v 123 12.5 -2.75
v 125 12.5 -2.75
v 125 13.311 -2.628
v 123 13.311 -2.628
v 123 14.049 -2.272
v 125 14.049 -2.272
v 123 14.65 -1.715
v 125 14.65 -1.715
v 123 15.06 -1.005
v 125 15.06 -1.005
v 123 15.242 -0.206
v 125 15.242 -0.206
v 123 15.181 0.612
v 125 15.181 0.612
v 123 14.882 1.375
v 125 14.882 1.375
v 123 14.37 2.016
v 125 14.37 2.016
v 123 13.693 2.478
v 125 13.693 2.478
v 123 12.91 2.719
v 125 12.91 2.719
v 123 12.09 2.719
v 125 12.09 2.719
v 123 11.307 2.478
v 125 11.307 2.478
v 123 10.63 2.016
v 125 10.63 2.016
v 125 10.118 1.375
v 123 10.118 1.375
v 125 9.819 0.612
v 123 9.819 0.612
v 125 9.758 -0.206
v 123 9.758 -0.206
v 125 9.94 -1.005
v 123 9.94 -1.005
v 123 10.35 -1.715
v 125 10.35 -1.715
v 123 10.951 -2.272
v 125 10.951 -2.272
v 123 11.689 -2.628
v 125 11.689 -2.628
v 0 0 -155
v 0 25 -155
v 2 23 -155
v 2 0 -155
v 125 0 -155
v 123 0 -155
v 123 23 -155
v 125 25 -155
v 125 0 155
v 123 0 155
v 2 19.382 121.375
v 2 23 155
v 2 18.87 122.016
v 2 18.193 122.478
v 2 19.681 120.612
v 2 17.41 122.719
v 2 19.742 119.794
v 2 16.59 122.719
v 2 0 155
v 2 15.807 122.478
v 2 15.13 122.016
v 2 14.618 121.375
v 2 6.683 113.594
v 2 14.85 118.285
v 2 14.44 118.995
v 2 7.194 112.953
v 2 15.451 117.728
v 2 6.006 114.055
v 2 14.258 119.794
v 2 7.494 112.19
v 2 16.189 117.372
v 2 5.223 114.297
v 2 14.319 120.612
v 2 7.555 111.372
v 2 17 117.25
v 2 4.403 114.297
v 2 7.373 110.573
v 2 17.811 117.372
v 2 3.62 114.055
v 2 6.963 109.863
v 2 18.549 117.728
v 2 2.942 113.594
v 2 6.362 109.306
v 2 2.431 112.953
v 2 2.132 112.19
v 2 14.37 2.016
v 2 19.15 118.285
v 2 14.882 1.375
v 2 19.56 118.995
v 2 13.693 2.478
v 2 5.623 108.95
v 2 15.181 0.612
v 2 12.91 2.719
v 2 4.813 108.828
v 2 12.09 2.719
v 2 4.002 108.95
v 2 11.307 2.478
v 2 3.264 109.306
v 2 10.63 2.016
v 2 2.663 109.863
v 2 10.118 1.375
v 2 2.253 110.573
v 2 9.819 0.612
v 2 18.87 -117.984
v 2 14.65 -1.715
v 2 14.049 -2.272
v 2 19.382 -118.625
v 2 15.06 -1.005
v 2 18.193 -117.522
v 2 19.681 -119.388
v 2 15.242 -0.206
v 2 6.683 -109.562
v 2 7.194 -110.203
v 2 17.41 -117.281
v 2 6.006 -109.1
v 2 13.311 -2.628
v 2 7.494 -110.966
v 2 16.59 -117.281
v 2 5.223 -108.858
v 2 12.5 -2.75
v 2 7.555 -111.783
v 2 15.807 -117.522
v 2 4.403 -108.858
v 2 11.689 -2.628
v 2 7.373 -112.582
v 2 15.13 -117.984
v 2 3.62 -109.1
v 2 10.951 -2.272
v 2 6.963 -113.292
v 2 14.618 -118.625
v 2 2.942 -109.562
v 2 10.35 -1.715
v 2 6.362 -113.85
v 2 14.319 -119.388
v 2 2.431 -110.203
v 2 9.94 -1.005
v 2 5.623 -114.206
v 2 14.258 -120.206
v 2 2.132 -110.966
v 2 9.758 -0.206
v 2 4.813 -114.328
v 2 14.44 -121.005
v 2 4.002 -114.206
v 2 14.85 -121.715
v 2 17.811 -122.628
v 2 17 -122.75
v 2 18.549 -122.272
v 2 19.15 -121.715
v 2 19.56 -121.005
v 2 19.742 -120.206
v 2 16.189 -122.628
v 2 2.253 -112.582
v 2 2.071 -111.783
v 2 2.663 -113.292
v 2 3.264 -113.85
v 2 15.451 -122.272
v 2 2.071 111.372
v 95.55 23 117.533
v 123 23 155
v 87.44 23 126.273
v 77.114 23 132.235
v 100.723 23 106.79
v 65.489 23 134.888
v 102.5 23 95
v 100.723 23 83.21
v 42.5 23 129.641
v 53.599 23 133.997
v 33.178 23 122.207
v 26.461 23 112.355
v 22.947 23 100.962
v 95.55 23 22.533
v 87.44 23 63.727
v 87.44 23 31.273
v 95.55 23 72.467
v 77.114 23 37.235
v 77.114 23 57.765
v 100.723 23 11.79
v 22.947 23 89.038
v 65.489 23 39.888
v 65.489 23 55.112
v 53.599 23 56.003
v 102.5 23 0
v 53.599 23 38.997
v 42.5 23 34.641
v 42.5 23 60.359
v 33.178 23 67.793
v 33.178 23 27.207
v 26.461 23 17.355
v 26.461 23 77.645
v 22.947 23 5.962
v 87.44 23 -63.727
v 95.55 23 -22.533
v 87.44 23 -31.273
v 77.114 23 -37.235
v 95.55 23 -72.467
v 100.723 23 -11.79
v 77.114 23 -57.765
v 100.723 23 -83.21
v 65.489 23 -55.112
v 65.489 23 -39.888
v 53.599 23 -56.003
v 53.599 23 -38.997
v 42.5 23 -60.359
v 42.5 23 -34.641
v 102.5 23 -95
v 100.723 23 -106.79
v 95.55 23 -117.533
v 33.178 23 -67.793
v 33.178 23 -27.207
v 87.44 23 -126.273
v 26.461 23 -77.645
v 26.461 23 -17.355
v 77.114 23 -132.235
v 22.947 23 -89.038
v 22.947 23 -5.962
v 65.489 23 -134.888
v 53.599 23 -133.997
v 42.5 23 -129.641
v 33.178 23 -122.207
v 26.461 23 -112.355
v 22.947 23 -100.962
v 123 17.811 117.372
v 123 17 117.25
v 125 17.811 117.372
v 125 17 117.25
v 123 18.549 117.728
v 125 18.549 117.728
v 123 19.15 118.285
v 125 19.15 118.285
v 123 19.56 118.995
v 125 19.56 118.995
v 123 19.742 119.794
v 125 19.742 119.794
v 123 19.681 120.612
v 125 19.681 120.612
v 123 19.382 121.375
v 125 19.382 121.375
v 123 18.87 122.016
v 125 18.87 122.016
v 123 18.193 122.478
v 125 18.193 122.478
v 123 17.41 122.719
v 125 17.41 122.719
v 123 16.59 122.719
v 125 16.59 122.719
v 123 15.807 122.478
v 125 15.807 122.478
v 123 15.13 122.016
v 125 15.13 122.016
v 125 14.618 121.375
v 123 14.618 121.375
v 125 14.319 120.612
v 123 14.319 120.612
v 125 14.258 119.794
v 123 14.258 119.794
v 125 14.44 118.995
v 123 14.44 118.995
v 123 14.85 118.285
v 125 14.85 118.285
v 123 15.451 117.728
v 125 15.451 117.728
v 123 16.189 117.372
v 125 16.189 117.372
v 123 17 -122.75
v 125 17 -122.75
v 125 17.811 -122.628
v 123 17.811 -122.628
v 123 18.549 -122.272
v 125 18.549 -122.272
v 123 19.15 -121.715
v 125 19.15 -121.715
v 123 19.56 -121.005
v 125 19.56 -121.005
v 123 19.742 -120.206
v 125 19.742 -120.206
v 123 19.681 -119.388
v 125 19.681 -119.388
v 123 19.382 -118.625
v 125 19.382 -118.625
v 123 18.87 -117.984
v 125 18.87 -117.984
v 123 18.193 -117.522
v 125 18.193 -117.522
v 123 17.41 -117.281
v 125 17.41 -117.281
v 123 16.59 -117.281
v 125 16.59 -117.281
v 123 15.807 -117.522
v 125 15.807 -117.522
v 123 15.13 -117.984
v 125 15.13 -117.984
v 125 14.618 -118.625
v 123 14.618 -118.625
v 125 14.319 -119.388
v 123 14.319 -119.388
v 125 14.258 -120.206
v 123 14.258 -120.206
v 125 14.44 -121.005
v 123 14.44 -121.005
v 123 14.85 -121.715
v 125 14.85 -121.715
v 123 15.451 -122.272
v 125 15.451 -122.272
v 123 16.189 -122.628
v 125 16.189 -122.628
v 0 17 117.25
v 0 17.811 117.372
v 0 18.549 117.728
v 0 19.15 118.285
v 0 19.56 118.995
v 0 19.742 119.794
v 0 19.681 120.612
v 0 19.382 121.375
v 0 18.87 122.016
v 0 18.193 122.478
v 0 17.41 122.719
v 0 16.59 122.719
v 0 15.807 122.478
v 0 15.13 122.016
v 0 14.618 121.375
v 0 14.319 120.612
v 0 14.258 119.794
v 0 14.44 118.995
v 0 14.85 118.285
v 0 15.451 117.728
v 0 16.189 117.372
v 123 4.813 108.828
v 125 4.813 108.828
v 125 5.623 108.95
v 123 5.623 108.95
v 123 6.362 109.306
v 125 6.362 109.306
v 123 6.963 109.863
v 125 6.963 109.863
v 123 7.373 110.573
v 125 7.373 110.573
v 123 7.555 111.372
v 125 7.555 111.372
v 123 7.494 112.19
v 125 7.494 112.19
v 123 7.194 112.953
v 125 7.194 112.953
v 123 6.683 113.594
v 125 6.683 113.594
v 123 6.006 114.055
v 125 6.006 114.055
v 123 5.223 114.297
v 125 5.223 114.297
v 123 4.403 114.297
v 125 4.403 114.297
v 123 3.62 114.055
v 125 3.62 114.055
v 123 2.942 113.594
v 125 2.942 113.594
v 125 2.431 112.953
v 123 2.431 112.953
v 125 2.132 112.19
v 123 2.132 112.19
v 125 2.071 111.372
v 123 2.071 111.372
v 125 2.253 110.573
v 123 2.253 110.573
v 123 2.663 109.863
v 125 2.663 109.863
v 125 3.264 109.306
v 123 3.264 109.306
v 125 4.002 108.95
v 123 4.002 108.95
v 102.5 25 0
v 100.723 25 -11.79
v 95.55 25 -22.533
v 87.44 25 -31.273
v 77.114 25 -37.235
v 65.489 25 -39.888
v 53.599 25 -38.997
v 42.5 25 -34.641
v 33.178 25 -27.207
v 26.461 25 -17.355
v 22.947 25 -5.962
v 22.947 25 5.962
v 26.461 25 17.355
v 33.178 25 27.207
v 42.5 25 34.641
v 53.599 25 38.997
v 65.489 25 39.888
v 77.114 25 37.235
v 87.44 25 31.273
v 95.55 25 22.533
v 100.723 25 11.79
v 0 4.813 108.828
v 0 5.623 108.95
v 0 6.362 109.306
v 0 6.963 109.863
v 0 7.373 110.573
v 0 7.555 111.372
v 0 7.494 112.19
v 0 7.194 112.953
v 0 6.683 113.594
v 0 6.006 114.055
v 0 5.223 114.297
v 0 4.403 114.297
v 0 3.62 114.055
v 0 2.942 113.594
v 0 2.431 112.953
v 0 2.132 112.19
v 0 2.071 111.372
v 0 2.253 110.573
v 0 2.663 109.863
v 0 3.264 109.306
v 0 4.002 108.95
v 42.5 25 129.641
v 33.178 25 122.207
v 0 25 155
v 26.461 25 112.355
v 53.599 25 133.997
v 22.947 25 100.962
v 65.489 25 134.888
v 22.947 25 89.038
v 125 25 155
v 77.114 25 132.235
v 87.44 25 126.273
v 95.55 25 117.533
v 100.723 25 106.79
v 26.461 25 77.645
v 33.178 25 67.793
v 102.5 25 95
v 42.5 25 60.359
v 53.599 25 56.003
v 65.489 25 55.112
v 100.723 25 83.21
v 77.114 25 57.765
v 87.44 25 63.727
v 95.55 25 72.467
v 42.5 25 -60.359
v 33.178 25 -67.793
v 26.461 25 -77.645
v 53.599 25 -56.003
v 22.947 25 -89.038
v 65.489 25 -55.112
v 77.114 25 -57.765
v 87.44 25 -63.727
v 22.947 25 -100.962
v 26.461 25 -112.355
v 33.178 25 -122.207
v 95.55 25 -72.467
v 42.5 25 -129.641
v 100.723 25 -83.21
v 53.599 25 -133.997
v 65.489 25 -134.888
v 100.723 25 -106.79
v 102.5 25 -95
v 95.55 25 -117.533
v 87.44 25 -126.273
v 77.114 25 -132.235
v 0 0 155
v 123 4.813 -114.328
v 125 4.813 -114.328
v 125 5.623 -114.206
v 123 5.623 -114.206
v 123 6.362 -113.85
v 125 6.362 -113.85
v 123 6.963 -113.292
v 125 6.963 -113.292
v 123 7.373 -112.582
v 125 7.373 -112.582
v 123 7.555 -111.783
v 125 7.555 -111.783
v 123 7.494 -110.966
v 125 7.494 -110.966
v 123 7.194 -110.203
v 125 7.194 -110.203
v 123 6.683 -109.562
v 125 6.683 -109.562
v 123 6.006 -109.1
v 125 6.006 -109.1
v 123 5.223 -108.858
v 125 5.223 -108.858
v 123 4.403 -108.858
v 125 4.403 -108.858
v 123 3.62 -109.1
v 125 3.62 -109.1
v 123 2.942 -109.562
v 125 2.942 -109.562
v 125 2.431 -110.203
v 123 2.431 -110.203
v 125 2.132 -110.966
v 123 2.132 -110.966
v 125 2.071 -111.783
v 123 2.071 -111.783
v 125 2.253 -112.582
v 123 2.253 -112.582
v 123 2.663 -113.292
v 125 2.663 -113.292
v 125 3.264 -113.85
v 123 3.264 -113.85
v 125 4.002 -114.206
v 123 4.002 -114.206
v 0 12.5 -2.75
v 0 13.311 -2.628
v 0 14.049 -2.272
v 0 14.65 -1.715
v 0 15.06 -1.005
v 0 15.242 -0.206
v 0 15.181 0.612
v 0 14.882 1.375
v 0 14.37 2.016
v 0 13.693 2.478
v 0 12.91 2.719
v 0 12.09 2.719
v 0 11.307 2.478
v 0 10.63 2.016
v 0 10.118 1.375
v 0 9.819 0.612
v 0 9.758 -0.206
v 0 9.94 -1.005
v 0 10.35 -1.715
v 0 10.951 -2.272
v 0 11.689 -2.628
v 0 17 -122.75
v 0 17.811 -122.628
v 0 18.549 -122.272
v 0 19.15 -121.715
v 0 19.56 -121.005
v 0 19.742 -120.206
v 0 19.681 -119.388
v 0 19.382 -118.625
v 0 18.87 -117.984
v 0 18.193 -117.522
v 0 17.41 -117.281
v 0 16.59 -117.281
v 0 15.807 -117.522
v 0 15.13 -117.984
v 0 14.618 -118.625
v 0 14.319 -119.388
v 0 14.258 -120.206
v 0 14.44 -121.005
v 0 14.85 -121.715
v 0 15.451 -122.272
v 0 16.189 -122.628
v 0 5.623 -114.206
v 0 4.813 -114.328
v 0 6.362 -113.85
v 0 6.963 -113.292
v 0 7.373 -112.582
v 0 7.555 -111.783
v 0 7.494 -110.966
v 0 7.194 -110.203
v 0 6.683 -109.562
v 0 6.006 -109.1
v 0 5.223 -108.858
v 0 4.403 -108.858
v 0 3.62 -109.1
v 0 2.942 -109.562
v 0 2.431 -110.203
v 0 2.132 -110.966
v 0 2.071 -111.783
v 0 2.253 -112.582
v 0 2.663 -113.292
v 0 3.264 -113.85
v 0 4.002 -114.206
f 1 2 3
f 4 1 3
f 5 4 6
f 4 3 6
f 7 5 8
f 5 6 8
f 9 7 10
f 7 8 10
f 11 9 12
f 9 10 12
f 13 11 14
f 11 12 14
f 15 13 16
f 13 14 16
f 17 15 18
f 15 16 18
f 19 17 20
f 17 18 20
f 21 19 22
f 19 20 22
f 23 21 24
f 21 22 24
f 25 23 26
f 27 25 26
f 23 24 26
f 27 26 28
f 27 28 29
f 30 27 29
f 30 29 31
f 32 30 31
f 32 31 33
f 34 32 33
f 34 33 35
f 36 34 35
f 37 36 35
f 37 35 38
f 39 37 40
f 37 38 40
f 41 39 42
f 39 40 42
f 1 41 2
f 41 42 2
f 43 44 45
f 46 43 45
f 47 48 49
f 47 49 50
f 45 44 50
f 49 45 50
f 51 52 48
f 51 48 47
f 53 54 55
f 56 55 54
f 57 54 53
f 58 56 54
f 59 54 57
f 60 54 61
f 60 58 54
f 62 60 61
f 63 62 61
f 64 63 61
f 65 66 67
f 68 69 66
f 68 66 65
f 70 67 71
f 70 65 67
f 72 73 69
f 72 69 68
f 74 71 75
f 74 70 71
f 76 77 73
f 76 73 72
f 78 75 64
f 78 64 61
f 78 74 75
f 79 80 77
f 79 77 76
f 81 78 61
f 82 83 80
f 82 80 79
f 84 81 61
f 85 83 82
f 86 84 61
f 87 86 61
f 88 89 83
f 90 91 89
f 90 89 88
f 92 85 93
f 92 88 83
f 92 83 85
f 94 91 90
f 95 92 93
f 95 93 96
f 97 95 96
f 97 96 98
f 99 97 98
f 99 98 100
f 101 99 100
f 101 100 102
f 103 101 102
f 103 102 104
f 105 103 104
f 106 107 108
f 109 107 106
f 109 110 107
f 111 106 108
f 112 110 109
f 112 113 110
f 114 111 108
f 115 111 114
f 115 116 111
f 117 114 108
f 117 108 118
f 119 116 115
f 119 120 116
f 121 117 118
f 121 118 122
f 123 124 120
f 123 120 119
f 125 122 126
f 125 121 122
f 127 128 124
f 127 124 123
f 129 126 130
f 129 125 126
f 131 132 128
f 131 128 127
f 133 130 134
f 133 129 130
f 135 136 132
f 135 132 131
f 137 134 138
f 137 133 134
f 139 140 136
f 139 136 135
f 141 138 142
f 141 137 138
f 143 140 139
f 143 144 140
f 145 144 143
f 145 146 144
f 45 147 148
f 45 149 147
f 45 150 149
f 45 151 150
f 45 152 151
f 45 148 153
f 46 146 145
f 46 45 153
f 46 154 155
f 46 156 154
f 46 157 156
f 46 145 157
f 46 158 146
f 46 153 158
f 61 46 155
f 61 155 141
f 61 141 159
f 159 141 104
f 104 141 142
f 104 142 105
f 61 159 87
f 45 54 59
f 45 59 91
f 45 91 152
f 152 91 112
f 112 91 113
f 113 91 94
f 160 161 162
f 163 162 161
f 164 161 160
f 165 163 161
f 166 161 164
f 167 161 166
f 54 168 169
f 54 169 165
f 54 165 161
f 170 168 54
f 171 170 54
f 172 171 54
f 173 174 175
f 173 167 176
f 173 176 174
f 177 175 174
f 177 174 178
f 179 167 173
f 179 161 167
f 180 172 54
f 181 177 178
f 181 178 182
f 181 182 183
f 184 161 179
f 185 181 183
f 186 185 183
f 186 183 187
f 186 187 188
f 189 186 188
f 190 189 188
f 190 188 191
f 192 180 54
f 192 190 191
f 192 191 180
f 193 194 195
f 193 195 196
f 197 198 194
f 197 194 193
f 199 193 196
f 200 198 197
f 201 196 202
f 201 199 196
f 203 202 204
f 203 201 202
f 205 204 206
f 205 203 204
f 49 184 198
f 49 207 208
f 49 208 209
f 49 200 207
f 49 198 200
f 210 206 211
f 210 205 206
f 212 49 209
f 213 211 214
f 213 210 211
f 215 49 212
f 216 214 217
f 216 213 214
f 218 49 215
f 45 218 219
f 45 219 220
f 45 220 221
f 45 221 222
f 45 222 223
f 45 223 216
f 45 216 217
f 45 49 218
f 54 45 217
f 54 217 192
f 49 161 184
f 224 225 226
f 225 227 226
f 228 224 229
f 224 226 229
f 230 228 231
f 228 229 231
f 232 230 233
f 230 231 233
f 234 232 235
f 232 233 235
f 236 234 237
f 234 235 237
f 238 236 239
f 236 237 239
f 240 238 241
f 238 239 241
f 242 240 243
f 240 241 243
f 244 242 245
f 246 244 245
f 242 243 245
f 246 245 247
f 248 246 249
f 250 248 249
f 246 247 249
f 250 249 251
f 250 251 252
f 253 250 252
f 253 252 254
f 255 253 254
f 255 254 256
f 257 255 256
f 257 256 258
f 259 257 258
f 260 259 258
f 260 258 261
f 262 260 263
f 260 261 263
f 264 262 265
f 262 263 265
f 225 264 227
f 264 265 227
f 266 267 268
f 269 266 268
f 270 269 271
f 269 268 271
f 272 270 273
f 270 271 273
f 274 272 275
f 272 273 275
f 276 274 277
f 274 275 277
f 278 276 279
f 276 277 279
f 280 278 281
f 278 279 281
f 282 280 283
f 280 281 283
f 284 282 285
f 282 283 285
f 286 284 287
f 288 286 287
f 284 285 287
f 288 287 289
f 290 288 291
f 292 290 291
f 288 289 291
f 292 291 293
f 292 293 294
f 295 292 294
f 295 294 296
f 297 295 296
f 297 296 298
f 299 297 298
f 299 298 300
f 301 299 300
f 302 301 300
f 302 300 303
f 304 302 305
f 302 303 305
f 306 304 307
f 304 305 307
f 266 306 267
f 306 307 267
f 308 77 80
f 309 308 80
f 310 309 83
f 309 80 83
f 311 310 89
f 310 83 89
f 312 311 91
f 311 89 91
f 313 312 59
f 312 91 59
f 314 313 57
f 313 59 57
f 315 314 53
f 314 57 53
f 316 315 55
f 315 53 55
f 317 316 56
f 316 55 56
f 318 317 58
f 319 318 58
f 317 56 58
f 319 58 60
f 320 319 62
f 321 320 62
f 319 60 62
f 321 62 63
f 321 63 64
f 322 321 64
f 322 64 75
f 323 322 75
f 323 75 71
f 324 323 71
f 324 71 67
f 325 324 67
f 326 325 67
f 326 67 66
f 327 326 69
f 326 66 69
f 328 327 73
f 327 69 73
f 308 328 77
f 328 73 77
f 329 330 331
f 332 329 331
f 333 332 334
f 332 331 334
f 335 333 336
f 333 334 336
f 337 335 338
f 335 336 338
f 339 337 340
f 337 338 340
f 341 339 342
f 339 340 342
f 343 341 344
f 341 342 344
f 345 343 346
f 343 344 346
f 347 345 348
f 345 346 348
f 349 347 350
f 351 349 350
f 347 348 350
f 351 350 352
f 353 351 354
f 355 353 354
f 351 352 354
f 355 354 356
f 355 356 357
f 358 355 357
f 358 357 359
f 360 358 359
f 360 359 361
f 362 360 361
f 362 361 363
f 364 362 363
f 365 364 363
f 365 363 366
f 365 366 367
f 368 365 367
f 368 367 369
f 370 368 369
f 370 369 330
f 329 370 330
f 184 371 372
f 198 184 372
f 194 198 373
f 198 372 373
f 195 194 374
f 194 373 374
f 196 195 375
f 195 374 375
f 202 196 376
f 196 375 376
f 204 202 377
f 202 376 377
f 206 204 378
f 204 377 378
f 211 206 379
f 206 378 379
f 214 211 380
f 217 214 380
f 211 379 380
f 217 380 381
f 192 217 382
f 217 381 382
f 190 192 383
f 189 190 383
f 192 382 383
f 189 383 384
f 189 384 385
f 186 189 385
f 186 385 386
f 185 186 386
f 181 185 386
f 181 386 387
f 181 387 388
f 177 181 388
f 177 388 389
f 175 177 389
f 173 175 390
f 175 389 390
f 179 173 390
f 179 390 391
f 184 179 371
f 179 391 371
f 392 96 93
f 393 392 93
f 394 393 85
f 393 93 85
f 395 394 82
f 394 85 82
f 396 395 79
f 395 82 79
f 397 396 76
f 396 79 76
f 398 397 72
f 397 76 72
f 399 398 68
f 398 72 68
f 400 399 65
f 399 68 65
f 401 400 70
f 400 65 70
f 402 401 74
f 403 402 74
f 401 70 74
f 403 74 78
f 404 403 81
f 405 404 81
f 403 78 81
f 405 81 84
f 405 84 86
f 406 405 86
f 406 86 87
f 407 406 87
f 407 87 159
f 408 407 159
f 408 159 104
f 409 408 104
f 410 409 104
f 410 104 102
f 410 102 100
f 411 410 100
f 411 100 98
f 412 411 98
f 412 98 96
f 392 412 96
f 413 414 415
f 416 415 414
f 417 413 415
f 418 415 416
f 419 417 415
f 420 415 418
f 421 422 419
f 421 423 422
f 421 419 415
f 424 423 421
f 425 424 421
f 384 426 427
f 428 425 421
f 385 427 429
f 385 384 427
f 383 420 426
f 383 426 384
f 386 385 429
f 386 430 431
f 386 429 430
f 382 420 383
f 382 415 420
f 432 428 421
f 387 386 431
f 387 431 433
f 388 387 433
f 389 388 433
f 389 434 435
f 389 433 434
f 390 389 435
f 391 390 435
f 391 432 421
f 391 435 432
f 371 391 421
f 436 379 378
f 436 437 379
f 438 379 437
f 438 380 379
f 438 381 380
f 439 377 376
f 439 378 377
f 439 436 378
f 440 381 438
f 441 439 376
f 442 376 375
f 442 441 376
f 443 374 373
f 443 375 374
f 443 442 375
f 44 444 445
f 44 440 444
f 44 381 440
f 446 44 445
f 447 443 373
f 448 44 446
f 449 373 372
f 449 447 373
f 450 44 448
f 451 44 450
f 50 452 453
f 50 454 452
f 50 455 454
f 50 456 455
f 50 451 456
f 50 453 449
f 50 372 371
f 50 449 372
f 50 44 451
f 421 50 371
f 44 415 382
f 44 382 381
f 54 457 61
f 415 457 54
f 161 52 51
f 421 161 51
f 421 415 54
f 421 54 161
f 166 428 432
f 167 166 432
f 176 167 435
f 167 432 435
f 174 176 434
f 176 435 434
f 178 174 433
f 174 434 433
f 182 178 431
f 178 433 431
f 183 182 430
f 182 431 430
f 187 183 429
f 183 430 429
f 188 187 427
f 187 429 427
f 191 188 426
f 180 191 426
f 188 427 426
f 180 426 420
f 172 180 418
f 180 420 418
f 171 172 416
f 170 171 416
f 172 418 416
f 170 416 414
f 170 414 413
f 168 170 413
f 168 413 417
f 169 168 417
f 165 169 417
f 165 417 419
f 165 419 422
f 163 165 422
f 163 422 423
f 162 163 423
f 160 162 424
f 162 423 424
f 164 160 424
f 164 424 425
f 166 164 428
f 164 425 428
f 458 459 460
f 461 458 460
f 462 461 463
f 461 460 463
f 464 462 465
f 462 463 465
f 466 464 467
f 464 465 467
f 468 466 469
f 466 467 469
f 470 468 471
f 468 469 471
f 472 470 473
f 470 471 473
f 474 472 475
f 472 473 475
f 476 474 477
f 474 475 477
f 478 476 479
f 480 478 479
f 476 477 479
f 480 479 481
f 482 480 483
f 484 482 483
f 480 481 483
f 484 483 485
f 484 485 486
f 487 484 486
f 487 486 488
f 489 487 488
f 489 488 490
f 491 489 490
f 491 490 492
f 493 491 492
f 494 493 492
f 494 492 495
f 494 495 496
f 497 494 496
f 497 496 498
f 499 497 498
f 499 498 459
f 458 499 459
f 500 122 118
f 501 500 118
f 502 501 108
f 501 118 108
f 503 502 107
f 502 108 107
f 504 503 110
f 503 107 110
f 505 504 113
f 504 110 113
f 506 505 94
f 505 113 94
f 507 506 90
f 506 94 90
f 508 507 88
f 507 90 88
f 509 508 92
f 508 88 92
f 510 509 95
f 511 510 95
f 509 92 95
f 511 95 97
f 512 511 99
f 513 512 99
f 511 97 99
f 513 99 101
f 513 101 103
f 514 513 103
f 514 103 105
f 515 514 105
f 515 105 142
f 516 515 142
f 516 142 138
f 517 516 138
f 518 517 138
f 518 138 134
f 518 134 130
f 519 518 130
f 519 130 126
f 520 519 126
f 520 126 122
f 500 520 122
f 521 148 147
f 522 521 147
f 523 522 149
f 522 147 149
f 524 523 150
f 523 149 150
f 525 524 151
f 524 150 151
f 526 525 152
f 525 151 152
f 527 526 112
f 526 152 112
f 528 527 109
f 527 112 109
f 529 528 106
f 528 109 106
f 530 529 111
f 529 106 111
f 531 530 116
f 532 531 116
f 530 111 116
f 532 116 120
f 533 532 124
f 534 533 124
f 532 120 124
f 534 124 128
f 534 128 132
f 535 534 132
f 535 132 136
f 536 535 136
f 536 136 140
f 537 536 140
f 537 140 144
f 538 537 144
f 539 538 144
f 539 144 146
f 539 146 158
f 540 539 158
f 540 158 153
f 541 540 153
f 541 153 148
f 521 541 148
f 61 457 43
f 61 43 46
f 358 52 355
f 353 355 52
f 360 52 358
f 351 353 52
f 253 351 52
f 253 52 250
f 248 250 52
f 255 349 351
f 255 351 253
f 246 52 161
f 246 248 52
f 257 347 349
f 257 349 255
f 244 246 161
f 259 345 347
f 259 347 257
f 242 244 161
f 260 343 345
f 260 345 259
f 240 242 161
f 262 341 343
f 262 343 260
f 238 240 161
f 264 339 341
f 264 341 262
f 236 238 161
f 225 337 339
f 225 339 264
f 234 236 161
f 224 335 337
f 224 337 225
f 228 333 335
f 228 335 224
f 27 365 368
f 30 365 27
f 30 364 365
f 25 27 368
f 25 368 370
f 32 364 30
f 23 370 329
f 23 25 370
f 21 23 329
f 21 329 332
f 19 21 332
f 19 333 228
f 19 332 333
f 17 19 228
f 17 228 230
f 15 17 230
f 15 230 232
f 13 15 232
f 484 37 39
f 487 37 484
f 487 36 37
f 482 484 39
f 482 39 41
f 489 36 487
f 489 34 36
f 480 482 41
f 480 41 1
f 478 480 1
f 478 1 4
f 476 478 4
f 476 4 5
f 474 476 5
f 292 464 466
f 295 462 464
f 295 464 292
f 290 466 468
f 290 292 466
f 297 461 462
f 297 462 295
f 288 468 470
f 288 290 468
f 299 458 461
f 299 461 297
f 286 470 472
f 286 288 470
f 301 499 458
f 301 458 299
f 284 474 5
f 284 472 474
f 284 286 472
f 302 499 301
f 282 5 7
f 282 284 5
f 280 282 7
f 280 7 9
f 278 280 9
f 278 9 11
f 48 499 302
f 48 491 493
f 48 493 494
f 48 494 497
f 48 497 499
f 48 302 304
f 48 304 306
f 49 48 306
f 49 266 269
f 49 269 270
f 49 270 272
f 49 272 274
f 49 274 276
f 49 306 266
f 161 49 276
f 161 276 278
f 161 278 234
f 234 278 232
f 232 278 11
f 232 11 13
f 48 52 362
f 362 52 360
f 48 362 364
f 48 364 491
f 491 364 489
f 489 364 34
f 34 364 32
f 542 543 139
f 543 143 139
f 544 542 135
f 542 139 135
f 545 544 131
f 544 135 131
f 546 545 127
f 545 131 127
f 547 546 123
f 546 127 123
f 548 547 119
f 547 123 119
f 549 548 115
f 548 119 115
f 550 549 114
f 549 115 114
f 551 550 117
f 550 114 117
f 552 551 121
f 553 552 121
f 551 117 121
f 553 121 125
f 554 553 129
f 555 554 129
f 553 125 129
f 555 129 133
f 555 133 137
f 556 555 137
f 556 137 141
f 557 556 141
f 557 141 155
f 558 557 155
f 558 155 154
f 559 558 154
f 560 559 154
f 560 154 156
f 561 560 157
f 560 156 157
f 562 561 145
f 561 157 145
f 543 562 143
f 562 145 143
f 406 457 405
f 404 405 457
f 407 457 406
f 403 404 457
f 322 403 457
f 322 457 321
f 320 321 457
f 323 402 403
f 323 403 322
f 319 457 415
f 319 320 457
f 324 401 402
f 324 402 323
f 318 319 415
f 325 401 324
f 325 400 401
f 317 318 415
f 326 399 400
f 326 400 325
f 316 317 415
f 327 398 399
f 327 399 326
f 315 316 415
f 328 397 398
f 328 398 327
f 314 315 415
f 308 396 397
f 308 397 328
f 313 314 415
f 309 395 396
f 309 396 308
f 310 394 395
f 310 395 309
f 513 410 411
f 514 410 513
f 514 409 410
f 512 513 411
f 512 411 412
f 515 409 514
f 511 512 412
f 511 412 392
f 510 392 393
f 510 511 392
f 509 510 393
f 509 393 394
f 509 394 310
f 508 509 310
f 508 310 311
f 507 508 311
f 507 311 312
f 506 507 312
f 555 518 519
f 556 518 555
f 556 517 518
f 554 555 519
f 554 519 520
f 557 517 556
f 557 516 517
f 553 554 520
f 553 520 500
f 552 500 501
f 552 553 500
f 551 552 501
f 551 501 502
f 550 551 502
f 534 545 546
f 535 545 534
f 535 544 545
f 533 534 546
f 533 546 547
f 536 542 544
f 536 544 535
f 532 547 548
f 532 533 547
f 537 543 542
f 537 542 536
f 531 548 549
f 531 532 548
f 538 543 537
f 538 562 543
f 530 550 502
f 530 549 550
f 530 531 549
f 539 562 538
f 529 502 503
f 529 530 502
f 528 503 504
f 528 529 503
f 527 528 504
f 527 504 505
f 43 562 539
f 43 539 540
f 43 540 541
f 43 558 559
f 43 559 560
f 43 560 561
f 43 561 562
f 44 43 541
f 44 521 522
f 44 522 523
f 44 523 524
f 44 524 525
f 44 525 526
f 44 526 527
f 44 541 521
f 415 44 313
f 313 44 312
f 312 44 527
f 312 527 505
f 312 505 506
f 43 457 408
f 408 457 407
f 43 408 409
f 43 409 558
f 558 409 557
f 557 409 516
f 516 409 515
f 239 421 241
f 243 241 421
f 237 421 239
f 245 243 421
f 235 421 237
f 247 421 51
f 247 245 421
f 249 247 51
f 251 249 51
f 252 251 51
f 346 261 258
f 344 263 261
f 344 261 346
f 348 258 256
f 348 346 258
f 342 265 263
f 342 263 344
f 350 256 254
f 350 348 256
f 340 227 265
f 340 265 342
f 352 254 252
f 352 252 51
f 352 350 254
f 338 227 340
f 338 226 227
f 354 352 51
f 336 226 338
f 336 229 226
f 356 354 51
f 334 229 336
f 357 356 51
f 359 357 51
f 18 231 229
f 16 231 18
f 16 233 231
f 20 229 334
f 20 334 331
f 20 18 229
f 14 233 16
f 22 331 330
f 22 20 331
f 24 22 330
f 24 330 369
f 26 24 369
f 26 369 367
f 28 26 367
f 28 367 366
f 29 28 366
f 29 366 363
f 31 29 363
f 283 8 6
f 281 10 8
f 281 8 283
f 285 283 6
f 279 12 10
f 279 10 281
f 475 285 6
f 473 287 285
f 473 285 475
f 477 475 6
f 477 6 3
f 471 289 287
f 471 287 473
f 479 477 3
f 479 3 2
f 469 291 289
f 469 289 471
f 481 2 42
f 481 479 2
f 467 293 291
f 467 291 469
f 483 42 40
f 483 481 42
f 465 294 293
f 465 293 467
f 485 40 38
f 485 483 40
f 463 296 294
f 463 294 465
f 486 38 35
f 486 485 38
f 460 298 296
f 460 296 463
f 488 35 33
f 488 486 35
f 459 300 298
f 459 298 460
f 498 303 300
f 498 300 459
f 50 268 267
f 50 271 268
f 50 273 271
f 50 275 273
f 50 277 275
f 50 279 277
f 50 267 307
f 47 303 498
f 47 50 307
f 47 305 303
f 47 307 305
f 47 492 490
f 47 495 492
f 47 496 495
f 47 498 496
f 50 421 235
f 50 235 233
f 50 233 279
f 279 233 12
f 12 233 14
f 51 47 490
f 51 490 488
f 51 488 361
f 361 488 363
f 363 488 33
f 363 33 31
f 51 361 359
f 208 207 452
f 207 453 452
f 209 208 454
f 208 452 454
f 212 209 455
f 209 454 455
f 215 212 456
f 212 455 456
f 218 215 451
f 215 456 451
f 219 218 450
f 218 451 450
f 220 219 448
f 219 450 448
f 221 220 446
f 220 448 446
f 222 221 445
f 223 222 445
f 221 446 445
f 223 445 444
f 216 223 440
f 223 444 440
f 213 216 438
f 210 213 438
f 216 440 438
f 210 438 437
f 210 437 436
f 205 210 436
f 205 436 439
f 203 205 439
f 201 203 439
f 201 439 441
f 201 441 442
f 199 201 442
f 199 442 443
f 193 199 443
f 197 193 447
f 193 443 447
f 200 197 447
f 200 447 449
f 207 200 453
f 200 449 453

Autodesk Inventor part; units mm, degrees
ref_plane "YZ Plane" through (0, 0, 0) normal (1, 0, 0) x (0, 1, 0)
ref_plane "XZ Plane" through (0, 0, 0) normal (0, 1, 0) x (-1, 0, 0)
ref_plane "XY Plane" through (0, 0, 0) normal (0, 0, 1) x (1, 0, 0)
sketch "Sketch1" plane through (0, 0, 0) normal (0, 0, 1) x (1, 0, 0)
  line L0 (0, 0) -> (0, 25)
  line L1 (0, 25) -> (125, 25)
  line L2 (125, 25) -> (125, 0)
  line L3 (123, 0) -> (123, 23)
  line L4 (123, 23) -> (2, 23)
  line L5 (2, 23) -> (2, 0)
  line L6 (0, 0) -> (2, 0)
  line L7 (123, 0) -> (125, 0)
  dimension "d0" = 25
  dimension "d1" = 125
  dimension "d2" = 25
  dimension "d3" = 2
extrude "Extrusion1" add sketch "Sketch1" along normal mid plane 310
sketch "Sketch2" plane through (125, 0, 155) normal (1, 0, 0) x (0, 0, -1)
  line L0 (-37.205, -32.4182) -> (-16.8959, -51.5992) projected
  arc A0 (-19.2763, -56.7631) -> (-16.8959, -51.5992) centre (-18.9558, -53.7803) ccw projected
  line L1 (-19.2763, -56.7631) -> (-50.7848, -53.3777) projected
  arc A1 (-50.7848, -53.3777) -> (-55.7745, -43.3621) centre (-69.9997, -56.6998) ccw projected
  line L2 (-55.7745, -43.3621) -> (-48.1388, -31.7992) projected
  arc A2 (-48.1388, -31.7992) -> (-37.205, -32.4182) centre (-41.913, -18.7038) ccw projected
  line L3 (-75.1262, -21.5392) -> (-58.4114, -21.5392) projected
  arc A3 (-55.5831, -23.5388) -> (-58.4114, -21.5392) centre (-58.4114, -24.5392) ccw projected
  arc A4 (-55.5831, -23.5388) -> (-54.0148, -26.691) centre (-41.913, -18.7038) ccw projected
  arc A5 (-54.0941, -30.1103) -> (-54.0148, -26.691) centre (-56.5186, -28.3435) ccw projected
  line L4 (-54.0941, -30.1103) -> (-59.464, -37.4794) projected
  arc A6 (-62.97, -38.511) -> (-59.464, -37.4794) centre (-61.8885, -35.7127) ccw projected
  arc A7 (-62.97, -38.511) -> (-89.4714, -57.7495) centre (-69.9997, -56.6998) ccw projected
  arc A8 (-91.9686, -60.8693) -> (-89.4714, -57.7495) centre (-92.4671, -57.911) ccw projected
  arc A9 (-94.9644, -58.0288) -> (-91.9686, -60.8693) centre (-91.9686, -57.8693) ccw projected
  arc A10 (-90.8616, -42.9236) -> (-94.9644, -58.0288) centre (-69.9997, -56.6998) ccw projected
  line L5 (-90.8616, -42.9236) -> (-77.6297, -22.886) projected
  arc A11 (-75.1262, -21.5392) -> (-77.6297, -22.886) centre (-75.1262, -24.5392) ccw projected
  line L6 (14.2226, -42.1262) -> (14.481, -34.3473) projected
  arc A12 (16.1692, -31.7481) -> (14.481, -34.3473) centre (17.4793, -34.4469) ccw projected
  arc A13 (16.1692, -31.7481) -> (22.7187, -25.3606) centre (9.837, -18.7038) ccw projected
  arc A14 (25.3838, -23.7379) -> (22.7187, -25.3606) centre (25.3838, -26.7379) ccw projected
  line L7 (25.3838, -23.7379) -> (32.9823, -23.7379) projected
  arc A15 (35.8164, -27.7217) -> (32.9823, -23.7379) centre (32.9823, -26.7379) ccw projected
  arc A16 (20.9479, -43.8593) -> (35.8164, -27.7217) centre (9.837, -18.7038) ccw projected
  line L8 (20.9479, -43.8593) -> (18.4331, -44.97) projected
  arc A17 (14.2226, -42.1262) -> (18.4331, -44.97) centre (17.221, -42.2258) ccw projected
  arc A18 (-58.5566, -72.4892) -> (-51.863, -63.8628) centre (-69.9997, -56.6998) ccw projected
  arc A19 (-48.6463, -61.9952) -> (-51.863, -63.8628) centre (-49.0727, -64.9648) ccw projected
  line L9 (-48.6463, -61.9952) -> (-37.4684, -63.6003) projected
  arc A20 (-36.6827, -69.3141) -> (-37.4684, -63.6003) centre (-37.8948, -66.5698) ccw projected
  line L10 (-36.6827, -69.3141) -> (-55.5841, -77.6626) projected
  arc A21 (-58.5566, -72.4892) -> (-55.5841, -77.6626) centre (-56.7962, -74.9183) ccw projected
  arc A22 (-88.4942, -73.521) -> (-79.2774, -79.9145) centre (-69.9997, -56.6998) ccw projected
  arc A23 (-87.0146, -70.1753) -> (-88.4942, -73.521) centre (-87.0146, -72.1753) ccw projected
  arc A24 (-83.5364, -70.7358) -> (-84.9248, -70.1753) centre (-84.9248, -72.1753) ccw projected
  arc A25 (-83.5364, -70.7358) -> (-77.7157, -74.6082) centre (-69.9997, -56.6998) ccw projected
  arc A26 (-76.5074, -76.4798) -> (-77.7157, -74.6082) centre (-78.5071, -76.445) ccw projected
  line L11 (14.545, -2.9927) -> (14.545, 4.5521) projected
  arc A27 (18.4889, 7.3998) -> (14.545, 4.5521) centre (17.545, 4.5521) ccw projected
  arc A28 (35.8164, -9.6858) -> (18.4889, 7.3998) centre (9.837, -18.7038) ccw projected
  arc A29 (32.9823, -13.6696) -> (35.8164, -9.6858) centre (32.9823, -10.6696) ccw projected
  line L12 (32.9823, -13.6696) -> (25.3838, -13.6696) projected
  arc A30 (22.7187, -12.0469) -> (25.3838, -13.6696) centre (25.3838, -10.6696) ccw projected
  arc A31 (22.7187, -12.0469) -> (16.2237, -5.6861) centre (9.837, -18.7038) ccw projected
  arc A32 (14.545, -2.9927) -> (16.2237, -5.6861) centre (17.545, -2.9927) ccw projected
  line L13 (-41.913, 8.7962) -> (-41.4149, 8.7962) projected
  arc A33 (-38.601, 4.7561) -> (-41.4149, 8.7962) centre (-41.4149, 5.7962) ccw projected
  line L14 (-38.601, 4.7561) -> (-41.237, -2.375) projected
  arc A34 (-43.6844, -4.3124) -> (-41.237, -2.375) centre (-44.0509, -1.3349) ccw projected
  arc A35 (-43.6844, -4.3124) -> (-55.5831, -13.8687) centre (-41.913, -18.7038) ccw projected
  arc A36 (-58.4114, -15.8684) -> (-55.5831, -13.8687) centre (-58.4114, -12.8684) ccw projected
  line L15 (-58.4114, -15.8684) -> (-67.4194, -15.8684) projected
  arc A37 (-69.9228, -11.2152) -> (-67.4194, -15.8684) centre (-67.4194, -12.8684) ccw projected
  line L16 (-69.9228, -11.2152) -> (-64.861, -3.5499) projected
  arc A38 (-41.913, 8.7962) -> (-64.861, -3.5499) centre (-41.913, -18.7038) ccw projected
  line L17 (-27.9232, -22.5166) -> (-4.1527, -22.5166) projected
  arc A39 (-4.1527, -22.5166) -> (3.5036, -31.7475) centre (9.837, -18.7038) ccw projected
  arc A40 (5.1099, -35.1484) -> (3.5036, -31.7475) centre (2.1933, -34.4462) ccw projected
  line L18 (5.1099, -35.1484) -> (1.9297, -48.3572) projected
  arc A41 (-2.7527, -50.0803) -> (1.9297, -48.3572) centre (-0.9869, -47.6549) ccw projected
  line L19 (-2.7527, -50.0803) -> (-31.7052, -29.0019) projected
  arc A42 (-31.7052, -29.0019) -> (-27.9232, -22.5166) centre (-41.913, -18.7038) ccw projected
  line L20 (-6.2824, -14.891) -> (-25.7935, -14.891) projected
  arc A43 (-28.5569, -13.0589) -> (-25.7935, -14.891) centre (-25.7935, -11.891) ccw projected
  arc A44 (-28.5569, -13.0589) -> (-34.5765, -6.1967) centre (-41.913, -18.7038) ccw projected
  arc A45 (-35.7016, -2.1898) -> (-34.5765, -6.1967) centre (-33.0586, -3.6091) ccw projected
  line L21 (-35.7016, -2.1898) -> (-30.651, 7.2155) projected
  arc A46 (-28.008, 8.7962) -> (-30.651, 7.2155) centre (-28.008, 5.7962) ccw projected
  line L22 (-28.008, 8.7962) -> (-0.2731, 8.7962) projected
  arc A47 (2.7269, 5.7962) -> (-0.2731, 8.7962) centre (-0.2731, 5.7962) ccw projected
  line L23 (2.7269, 5.7962) -> (2.7269, -4.4197) projected
  arc A48 (1.46, -6.8684) -> (2.7269, -4.4197) centre (-0.2731, -4.4197) ccw projected
  arc A49 (1.46, -6.8684) -> (-3.5191, -13.0589) centre (9.837, -18.7038) ccw projected
  arc A50 (-6.2824, -14.891) -> (-3.5191, -13.0589) centre (-6.2824, -11.891) ccw projected
  circle A51 centre (-81.913, -5.781) radius 2.75 projected
  circle A52 centre (7.837, -58.4172) radius 2.75 projected
  circle A53 centre (-19.913, 17.776) radius 2.75 projected
  circle A54 centre (-109.9997, -47.6996) radius 2.75 projected
  circle A55 centre (43.4223, 4.8129) radius 2.75 projected
  line L24 (-25.906, 18.0659) -> (-40.1014, 18.7524) projected
  arc A56 (-40.1014, 18.7524) -> (-73.2057, 1.9606) centre (-41.913, -18.7038) ccw projected
  line L25 (-73.2057, 1.9606) -> (-74.4501, 0.0761) projected
  arc A57 (-78.6067, -0.7742) -> (-82.3668, 0.2018) centre (-81.913, -5.781) ccw projected
  line L26 (-85.6456, -16.8777) -> (-99.2063, -37.4131) projected
  arc A58 (-99.2063, -37.4131) -> (-100.1023, -38.8439) centre (-69.9997, -56.6998) ccw projected
  arc A59 (-113.4192, -52.6298) -> (-109.9997, -53.6996) centre (-109.9997, -47.6996) ccw projected
  line L27 (-109.9997, -53.6996) -> (-107.9997, -53.6996) projected
  arc A60 (-104.9997, -56.6996) -> (-54.959, -88.3032) centre (-69.9997, -56.6998) ccw projected
  line L28 (-54.959, -88.3032) -> (2.4193, -60.9957) projected
  arc A61 (2.4193, -60.9957) -> (13.2548, -55.8388) centre (7.837, -58.4172) ccw projected
  line L29 (13.2548, -55.8388) -> (24.8778, -50.3072) projected
  arc A62 (24.8778, -50.3072) -> (42.845, -7.0644) centre (9.837, -18.7038) ccw projected
  line L30 (42.845, -7.0644) -> (48.4494, 1.5375) projected
  arc A63 (48.4494, 1.5375) -> (42.0639, 10.6571) centre (43.4223, 4.8129) ccw projected
  line L31 (42.0639, 10.6571) -> (32.0639, 8.3327) projected
  arc A64 (32.0639, 8.3327) -> (11.5279, 16.2554) centre (9.837, -18.7038) ccw projected
  line L32 (11.5279, 16.2554) -> (-13.92, 17.4862) projected
  arc A65 (-13.92, 17.4862) -> (-25.906, 18.0659) centre (-19.913, 17.776) ccw projected
  circle A66 centre (-69.9997, -56.6998) radius 9.5 projected
  circle A67 centre (-41.913, -18.7038) radius 9.5 projected
  circle A68 centre (9.837, -18.7038) radius 9.5 projected
  circle A69 centre (35, 17) radius 2.75
  circle A70 centre (155, 12.5) radius 2.75
  line L33 (155, 0) -> (155, 25)
  line L34 (0, 25) -> (310, 25) projected
  line L35 (0, 0) -> (0, 25) projected
  circle A71 centre (266.5777, 4.8129) radius 2.75
  circle A72 centre (275, 17) radius 2.75
  circle A73 centre (155, 12.5) radius 2.75
  circle A74 centre (-106.7656, -26.4398) radius 1.65 projected
  arc A75 (-104.9997, -56.6996) -> (-107.9997, -53.6996) centre (-107.9997, -56.6996) ccw projected
  arc A76 (-78.6067, -0.7742) -> (-74.4501, 0.0761) centre (-76.9535, 1.7293) ccw projected
  line L36 (-82.3668, 0.2018) -> (-122.8325, -2.8676) projected
  arc A77 (-122.8325, -2.8676) -> (-132.7182, -39.2443) centre (-121.3198, -22.8103) ccw projected
  line L37 (-132.7182, -39.2443) -> (-113.4192, -52.6298) projected
  circle A78 centre (-131.7402, -33.5999) radius 1.65 projected
  circle A79 centre (-121.3198, -22.8103) radius 10.5 projected
  circle A80 centre (-125.4537, -8.3911) radius 1.65 projected
  line L38 (-104.3923, -39.7785) -> (-104.8988, -39.4272) projected
  arc A81 (-105.5539, -35.1162) -> (-104.8988, -39.4272) centre (-103.189, -36.9621) ccw projected
  arc A82 (-105.5539, -35.1162) -> (-102.1972, -16.9514) centre (-121.3198, -22.8103) ccw projected
  arc A83 (-99.5557, -13.0811) -> (-102.1972, -16.9514) centre (-99.3288, -16.0725) ccw projected
  line L39 (-99.5557, -13.0811) -> (-88.3759, -12.2331) projected
  arc A84 (-85.6456, -16.8777) -> (-88.3759, -12.2331) centre (-88.149, -15.2245) ccw projected
  arc A85 (-104.3923, -39.7785) -> (-100.1023, -38.8439) centre (-102.6826, -37.3134) ccw projected
  line L40 (-76.5074, -76.4798) -> (-76.5355, -78.0922) projected
  arc A86 (-79.2774, -79.9145) -> (-76.5355, -78.0922) centre (-78.5352, -78.0573) ccw projected
  line L41 (-87.0146, -70.1753) -> (-84.9248, -70.1753) projected
  point P0 (-69.9997, -56.6998)
  point P1 (-69.9997, -56.6998)
  point P2 (-69.9997, -56.6998)
  point P3 (-69.9997, -56.6998)
  point P4 (-107.9997, -56.6996)
  point P5 (-102.6826, -37.3134)
  point P6 (-69.9997, -56.6998)
  dimension "d6" = 5.5
  dimension "d7" = 5.5
  dimension "d8" = 8
  dimension "d9" = 12.5
  dimension "d10" = 35
extrude "Extrusion2" cut sketch "Sketch2" against normal blind 205.75 contours A70 L33 | L33 A70 | A55 | A69 | A71 | A72
sketch "Sketch3" plane through (0, 25, 155) normal (0, 1, 0) x (1, 0, 0)
  circle A0 centre (62.5, 60) radius 40
  line L0 (125, 0) -> (125, 310) projected
  line L1 (125, 0) -> (0, 0) projected
  circle A1 centre (62.5, 250) radius 40
  line L2 (0, 310) -> (125, 310) projected
  circle A2 centre (62.5, 155) radius 40
  point P0 (0, 155)
  dimension "d13" = 80
  dimension "d14" = 62.5
  dimension "d15" = 60
  dimension "d16" = 80
  dimension "d17" = 62.5
  dimension "d18" = 60
  dimension "d19" = 80
  dimension "d20" = 62.5
  dimension "d21" = 155
extrude "Extrusion3" cut sketch "Sketch3" against normal blind 10
properties part number "Mottor Protection Piece" material "Aluminum 6061"
